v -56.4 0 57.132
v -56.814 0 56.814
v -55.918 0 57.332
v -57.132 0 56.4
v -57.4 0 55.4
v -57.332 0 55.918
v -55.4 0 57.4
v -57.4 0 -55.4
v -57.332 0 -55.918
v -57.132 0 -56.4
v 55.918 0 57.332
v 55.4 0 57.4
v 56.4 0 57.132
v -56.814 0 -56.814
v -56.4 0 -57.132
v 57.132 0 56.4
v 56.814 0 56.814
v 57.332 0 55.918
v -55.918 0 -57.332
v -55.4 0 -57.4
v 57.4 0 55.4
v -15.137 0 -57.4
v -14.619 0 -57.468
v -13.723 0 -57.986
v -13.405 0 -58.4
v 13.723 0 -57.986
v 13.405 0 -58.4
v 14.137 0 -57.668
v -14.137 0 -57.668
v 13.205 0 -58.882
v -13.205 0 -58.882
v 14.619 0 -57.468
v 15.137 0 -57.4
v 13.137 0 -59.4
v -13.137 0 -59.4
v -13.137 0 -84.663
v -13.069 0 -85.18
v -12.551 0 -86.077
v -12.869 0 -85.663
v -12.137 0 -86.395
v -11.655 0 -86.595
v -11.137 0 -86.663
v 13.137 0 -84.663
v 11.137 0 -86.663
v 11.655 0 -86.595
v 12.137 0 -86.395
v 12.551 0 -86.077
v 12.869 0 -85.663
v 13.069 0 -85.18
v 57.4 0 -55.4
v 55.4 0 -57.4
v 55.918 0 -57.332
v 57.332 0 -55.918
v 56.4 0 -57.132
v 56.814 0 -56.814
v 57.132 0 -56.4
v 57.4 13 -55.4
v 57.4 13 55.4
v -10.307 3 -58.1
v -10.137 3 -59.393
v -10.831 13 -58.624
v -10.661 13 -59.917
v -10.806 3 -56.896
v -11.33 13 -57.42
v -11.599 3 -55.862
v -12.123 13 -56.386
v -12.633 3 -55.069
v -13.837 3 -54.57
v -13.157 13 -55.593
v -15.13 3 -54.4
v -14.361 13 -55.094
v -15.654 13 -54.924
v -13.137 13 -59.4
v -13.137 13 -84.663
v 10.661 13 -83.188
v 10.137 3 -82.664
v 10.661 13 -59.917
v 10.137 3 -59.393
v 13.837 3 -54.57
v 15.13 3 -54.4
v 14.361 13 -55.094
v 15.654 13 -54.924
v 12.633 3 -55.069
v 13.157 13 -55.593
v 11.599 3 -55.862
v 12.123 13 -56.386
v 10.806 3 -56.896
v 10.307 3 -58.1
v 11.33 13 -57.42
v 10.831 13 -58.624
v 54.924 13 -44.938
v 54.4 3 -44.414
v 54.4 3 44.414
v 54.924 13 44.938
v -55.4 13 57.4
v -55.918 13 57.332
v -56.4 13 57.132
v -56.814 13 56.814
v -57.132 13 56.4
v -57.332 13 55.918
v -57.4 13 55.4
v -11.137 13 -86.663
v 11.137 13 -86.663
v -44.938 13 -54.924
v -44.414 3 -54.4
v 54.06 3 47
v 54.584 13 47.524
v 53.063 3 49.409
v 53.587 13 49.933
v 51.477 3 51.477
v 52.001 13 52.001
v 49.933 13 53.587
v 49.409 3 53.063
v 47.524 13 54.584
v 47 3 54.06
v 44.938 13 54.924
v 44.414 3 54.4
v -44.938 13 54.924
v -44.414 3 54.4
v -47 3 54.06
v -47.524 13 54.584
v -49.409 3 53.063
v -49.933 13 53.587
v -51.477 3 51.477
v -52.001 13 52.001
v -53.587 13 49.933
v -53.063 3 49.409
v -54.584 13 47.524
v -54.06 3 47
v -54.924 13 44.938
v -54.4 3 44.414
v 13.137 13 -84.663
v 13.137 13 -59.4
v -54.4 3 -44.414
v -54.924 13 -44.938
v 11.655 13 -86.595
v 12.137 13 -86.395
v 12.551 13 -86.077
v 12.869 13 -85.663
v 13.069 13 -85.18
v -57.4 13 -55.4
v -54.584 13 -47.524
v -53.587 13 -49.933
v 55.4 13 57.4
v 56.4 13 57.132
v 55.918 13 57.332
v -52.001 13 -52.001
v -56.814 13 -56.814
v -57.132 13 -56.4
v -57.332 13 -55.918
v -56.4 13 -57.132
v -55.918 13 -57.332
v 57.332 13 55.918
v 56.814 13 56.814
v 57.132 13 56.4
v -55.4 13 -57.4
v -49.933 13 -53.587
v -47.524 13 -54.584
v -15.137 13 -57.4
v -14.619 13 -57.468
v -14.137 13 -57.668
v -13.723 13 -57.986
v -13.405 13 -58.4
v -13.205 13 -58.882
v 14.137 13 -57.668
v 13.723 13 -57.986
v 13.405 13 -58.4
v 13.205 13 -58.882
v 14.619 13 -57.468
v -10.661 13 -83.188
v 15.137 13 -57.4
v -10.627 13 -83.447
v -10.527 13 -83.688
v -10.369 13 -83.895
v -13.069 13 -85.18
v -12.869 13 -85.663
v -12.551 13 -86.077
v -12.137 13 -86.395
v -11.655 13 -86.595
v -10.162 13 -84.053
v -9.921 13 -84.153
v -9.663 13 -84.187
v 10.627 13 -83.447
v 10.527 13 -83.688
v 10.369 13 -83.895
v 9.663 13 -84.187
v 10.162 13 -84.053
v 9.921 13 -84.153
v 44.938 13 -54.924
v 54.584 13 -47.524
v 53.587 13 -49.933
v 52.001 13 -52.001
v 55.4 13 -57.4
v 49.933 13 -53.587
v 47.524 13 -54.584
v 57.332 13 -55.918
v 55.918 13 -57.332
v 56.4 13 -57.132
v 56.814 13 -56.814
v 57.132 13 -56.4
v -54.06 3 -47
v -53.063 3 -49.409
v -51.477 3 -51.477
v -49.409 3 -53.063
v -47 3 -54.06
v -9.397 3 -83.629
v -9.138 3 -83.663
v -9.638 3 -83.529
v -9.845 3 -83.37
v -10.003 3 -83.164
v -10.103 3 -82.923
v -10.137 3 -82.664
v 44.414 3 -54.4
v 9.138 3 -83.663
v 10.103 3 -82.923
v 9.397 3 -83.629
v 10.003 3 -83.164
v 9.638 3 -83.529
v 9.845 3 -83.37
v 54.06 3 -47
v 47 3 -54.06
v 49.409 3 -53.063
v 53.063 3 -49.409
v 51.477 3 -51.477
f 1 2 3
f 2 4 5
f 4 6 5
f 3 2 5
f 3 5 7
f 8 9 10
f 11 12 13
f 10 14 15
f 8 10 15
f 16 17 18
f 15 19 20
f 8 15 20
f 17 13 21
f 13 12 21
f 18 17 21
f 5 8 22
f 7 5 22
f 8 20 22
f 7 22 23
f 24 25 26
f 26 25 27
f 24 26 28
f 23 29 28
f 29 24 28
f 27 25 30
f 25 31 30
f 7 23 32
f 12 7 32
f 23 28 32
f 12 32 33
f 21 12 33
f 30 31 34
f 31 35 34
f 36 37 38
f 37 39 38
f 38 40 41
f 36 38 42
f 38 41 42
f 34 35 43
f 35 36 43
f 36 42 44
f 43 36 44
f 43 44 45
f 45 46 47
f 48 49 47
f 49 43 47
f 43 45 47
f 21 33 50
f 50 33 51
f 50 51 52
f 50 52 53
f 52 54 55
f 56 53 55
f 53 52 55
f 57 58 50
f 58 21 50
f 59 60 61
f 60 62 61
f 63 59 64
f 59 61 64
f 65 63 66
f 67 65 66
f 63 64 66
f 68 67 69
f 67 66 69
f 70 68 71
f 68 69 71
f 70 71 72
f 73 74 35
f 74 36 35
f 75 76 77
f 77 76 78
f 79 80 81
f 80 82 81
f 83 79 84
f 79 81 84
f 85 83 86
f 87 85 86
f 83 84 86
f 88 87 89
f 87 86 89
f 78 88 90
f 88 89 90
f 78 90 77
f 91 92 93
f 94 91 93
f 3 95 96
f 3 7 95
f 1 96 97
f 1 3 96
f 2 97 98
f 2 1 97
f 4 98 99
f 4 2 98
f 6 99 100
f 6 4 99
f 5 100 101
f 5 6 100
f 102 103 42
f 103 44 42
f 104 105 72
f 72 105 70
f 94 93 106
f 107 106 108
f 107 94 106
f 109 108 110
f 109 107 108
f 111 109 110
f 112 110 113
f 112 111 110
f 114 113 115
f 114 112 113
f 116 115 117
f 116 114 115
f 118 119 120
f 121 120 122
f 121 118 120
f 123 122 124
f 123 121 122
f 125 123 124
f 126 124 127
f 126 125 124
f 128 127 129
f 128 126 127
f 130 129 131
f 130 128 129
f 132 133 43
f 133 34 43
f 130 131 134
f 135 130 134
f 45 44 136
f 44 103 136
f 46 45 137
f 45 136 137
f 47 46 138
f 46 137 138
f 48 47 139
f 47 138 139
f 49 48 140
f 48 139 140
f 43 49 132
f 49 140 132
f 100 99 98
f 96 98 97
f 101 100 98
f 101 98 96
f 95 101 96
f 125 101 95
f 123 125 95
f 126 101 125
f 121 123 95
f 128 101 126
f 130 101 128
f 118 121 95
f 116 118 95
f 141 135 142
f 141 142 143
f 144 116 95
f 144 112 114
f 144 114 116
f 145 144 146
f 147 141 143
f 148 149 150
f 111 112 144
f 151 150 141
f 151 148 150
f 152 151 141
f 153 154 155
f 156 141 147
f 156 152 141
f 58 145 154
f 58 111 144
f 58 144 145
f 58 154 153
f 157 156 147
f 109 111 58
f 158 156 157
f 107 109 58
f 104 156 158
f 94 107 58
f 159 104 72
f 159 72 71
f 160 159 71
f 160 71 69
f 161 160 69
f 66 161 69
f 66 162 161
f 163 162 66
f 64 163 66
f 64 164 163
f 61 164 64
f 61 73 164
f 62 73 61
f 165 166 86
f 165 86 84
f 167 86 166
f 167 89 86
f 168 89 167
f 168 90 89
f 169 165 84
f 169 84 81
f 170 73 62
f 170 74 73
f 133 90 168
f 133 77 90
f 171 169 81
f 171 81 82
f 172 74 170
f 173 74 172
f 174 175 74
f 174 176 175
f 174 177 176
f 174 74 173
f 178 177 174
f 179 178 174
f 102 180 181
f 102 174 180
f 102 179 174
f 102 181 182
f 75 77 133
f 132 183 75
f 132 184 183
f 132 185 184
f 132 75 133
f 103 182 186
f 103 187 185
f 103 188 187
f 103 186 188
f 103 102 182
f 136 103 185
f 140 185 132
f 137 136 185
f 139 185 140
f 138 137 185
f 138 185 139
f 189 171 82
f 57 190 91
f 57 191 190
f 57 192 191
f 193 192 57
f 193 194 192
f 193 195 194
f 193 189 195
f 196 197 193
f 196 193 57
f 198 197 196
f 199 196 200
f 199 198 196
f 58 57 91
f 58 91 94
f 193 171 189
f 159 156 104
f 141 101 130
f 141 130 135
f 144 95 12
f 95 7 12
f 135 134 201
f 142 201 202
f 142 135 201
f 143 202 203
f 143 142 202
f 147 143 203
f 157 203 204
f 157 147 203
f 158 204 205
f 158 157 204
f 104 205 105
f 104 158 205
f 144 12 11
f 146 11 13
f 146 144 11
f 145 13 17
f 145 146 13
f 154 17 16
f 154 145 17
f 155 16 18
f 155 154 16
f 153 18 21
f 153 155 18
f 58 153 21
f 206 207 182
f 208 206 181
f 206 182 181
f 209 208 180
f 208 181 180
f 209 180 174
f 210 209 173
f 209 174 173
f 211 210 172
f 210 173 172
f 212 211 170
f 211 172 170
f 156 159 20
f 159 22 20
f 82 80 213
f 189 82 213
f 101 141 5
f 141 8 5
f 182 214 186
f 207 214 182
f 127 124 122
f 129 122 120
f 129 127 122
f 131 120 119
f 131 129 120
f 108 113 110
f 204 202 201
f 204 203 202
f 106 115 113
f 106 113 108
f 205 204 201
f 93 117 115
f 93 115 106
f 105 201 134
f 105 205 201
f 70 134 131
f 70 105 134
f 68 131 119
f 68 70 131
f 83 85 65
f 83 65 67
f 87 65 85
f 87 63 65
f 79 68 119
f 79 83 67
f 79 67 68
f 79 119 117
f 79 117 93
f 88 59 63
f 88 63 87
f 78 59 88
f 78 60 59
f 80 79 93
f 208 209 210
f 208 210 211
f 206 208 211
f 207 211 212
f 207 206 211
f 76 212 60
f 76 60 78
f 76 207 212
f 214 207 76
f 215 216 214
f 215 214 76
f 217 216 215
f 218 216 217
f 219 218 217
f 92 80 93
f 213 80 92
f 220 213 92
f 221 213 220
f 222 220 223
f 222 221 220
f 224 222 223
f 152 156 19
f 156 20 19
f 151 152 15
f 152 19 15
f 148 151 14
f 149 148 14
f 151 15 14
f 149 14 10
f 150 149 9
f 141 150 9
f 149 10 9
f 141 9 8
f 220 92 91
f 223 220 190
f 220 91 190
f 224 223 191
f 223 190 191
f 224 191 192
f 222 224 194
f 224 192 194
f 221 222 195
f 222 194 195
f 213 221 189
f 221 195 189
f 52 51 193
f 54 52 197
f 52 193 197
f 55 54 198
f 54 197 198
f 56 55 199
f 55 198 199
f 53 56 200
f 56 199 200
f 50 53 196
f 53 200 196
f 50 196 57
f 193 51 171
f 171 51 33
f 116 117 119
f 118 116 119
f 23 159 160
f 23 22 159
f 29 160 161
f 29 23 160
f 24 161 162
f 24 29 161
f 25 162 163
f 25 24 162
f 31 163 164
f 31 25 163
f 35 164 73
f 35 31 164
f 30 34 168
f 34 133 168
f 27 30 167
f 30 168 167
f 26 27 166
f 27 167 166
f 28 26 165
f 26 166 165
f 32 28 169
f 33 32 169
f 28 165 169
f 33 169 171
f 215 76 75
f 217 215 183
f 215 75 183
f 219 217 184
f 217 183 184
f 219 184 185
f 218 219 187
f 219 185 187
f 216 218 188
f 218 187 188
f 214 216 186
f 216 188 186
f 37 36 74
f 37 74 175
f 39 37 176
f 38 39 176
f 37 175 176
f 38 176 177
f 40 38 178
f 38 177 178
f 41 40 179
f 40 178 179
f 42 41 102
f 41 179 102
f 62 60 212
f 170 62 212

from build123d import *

# Parameters (mm, degrees)
BOSS_EXTRUDE3_DEPTH = 3
BOSS_EXTRUDE4_START = 3
BOSS_EXTRUDE4_DEPTH = 10
DRAFT12_ANGLE       = 3
FILLET1_R           = 2
FILLET3_R           = 10
FILLET4_R           = 5
FILLET5_R           = 1


with BuildPart() as part:
    # Sketch2 → Boss-Extrude3 (new body)
    with BuildSketch(Plane(origin=(0, 0, 0), x_dir=(1, 0, 0), z_dir=(0, 1, 0))):
        Polygon((-57.4, 57.4), (-57.4, -57.4), (57.4, -57.4), (57.4, 57.4), (13.13705704, 57.4), (13.13705704, 86.662771881), (-13.13705704, 86.662771881), (-13.13705704, 57.4), align=None)
    extrude(amount=BOSS_EXTRUDE3_DEPTH)

    # Sketch2<5> → Boss-Extrude4 (add)
    with BuildSketch(Plane(origin=(0, 0, 0), x_dir=(1, 0, 0), z_dir=(0, 1, 0)).offset(BOSS_EXTRUDE4_START)):
        Polygon((-57.4, 44.4), (-57.4, -44.4), (-57.4, -57.4), (-44.4, -57.4), (44.4, -57.4), (57.4, -57.4), (57.4, -44.4), (57.4, 44.4), (57.4, 57.4), (44.4, 57.4), (13.13705704, 57.4), (13.13705704, 86.662771881), (-13.13705704, 86.662771881), (-13.13705704, 57.4), (-44.4, 57.4), (-57.4, 57.4), align=None)
        Polygon((54.4, -44.4), (54.4, 44.4), (54.4, 54.4), (44.4, 54.4), (13.13705704, 54.4), (10.13705704, 54.4), (10.13705704, 57.4), (10.13705704, 83.662771881), (-10.13705704, 83.662771881), (-10.13705704, 57.4), (-10.13705704, 54.4), (-13.13705704, 54.4), (-44.4, 54.4), (-54.4, 54.4), (-54.4, 44.4), (-54.4, -44.4), (-54.4, -54.4), (-44.4, -54.4), (44.4, -54.4), (54.4, -54.4), align=None, mode=Mode.SUBTRACT)
    extrude(amount=BOSS_EXTRUDE4_DEPTH)

    # Draft12
    draft12_faces = [part.faces().sort_by_distance(p)[0] for p in [
        (-10.13705704, 8, -69.03138594),
        (-32.26852852, 8, -54.4),
        (-54.4, 8, 0),
        (0, 8, 54.4),
        (54.4, 8, 0),
        (0, 8, -83.662771881),
        (32.26852852, 8, -54.4),
        (10.13705704, 8, -69.03138594),
    ]]
    draft(draft12_faces, Plane.ZX.offset(3), DRAFT12_ANGLE)

    # Fillet1
    fillet1_edges = [part.edges().sort_by_distance(p)[0] for p in [
        (-57.4, 6.5, -57.4),
        (-13.13705704, 6.5, -57.4),
        (-13.13705704, 6.5, -86.662771881),
        (13.13705704, 6.5, -86.662771881),
        (13.13705704, 6.5, -57.4),
        (57.4, 6.5, -57.4),
        (57.4, 6.5, 57.4),
        (-57.4, 6.5, 57.4),
    ]]
    fillet(fillet1_edges, radius=FILLET1_R)

    # Fillet3
    fillet3_edges = [part.edges().sort_by_distance(p)[0] for p in [
        (-54.662038896, 8, -54.662038896),
        (-54.662038896, 8, 54.662038896),
        (54.662038896, 8, 54.662038896),
        (54.662038896, 8, -54.662038896),
    ]]
    fillet(fillet3_edges, radius=FILLET3_R)

    # Fillet4
    fillet4_edges = [part.edges().sort_by_distance(p)[0] for p in [
        (10.399095937, 8, -54.662038896),
        (-10.399095937, 8, -54.662038896),
    ]]
    fillet(fillet4_edges, radius=FILLET4_R)

    # Fillet5
    fillet5_edges = [part.edges().sort_by_distance(p)[0] for p in [
        (10.399095937, 8, -83.924810777),
        (-10.399095937, 8, -83.924810777),
    ]]
    fillet(fillet5_edges, radius=FILLET5_R)


solid = part.part
